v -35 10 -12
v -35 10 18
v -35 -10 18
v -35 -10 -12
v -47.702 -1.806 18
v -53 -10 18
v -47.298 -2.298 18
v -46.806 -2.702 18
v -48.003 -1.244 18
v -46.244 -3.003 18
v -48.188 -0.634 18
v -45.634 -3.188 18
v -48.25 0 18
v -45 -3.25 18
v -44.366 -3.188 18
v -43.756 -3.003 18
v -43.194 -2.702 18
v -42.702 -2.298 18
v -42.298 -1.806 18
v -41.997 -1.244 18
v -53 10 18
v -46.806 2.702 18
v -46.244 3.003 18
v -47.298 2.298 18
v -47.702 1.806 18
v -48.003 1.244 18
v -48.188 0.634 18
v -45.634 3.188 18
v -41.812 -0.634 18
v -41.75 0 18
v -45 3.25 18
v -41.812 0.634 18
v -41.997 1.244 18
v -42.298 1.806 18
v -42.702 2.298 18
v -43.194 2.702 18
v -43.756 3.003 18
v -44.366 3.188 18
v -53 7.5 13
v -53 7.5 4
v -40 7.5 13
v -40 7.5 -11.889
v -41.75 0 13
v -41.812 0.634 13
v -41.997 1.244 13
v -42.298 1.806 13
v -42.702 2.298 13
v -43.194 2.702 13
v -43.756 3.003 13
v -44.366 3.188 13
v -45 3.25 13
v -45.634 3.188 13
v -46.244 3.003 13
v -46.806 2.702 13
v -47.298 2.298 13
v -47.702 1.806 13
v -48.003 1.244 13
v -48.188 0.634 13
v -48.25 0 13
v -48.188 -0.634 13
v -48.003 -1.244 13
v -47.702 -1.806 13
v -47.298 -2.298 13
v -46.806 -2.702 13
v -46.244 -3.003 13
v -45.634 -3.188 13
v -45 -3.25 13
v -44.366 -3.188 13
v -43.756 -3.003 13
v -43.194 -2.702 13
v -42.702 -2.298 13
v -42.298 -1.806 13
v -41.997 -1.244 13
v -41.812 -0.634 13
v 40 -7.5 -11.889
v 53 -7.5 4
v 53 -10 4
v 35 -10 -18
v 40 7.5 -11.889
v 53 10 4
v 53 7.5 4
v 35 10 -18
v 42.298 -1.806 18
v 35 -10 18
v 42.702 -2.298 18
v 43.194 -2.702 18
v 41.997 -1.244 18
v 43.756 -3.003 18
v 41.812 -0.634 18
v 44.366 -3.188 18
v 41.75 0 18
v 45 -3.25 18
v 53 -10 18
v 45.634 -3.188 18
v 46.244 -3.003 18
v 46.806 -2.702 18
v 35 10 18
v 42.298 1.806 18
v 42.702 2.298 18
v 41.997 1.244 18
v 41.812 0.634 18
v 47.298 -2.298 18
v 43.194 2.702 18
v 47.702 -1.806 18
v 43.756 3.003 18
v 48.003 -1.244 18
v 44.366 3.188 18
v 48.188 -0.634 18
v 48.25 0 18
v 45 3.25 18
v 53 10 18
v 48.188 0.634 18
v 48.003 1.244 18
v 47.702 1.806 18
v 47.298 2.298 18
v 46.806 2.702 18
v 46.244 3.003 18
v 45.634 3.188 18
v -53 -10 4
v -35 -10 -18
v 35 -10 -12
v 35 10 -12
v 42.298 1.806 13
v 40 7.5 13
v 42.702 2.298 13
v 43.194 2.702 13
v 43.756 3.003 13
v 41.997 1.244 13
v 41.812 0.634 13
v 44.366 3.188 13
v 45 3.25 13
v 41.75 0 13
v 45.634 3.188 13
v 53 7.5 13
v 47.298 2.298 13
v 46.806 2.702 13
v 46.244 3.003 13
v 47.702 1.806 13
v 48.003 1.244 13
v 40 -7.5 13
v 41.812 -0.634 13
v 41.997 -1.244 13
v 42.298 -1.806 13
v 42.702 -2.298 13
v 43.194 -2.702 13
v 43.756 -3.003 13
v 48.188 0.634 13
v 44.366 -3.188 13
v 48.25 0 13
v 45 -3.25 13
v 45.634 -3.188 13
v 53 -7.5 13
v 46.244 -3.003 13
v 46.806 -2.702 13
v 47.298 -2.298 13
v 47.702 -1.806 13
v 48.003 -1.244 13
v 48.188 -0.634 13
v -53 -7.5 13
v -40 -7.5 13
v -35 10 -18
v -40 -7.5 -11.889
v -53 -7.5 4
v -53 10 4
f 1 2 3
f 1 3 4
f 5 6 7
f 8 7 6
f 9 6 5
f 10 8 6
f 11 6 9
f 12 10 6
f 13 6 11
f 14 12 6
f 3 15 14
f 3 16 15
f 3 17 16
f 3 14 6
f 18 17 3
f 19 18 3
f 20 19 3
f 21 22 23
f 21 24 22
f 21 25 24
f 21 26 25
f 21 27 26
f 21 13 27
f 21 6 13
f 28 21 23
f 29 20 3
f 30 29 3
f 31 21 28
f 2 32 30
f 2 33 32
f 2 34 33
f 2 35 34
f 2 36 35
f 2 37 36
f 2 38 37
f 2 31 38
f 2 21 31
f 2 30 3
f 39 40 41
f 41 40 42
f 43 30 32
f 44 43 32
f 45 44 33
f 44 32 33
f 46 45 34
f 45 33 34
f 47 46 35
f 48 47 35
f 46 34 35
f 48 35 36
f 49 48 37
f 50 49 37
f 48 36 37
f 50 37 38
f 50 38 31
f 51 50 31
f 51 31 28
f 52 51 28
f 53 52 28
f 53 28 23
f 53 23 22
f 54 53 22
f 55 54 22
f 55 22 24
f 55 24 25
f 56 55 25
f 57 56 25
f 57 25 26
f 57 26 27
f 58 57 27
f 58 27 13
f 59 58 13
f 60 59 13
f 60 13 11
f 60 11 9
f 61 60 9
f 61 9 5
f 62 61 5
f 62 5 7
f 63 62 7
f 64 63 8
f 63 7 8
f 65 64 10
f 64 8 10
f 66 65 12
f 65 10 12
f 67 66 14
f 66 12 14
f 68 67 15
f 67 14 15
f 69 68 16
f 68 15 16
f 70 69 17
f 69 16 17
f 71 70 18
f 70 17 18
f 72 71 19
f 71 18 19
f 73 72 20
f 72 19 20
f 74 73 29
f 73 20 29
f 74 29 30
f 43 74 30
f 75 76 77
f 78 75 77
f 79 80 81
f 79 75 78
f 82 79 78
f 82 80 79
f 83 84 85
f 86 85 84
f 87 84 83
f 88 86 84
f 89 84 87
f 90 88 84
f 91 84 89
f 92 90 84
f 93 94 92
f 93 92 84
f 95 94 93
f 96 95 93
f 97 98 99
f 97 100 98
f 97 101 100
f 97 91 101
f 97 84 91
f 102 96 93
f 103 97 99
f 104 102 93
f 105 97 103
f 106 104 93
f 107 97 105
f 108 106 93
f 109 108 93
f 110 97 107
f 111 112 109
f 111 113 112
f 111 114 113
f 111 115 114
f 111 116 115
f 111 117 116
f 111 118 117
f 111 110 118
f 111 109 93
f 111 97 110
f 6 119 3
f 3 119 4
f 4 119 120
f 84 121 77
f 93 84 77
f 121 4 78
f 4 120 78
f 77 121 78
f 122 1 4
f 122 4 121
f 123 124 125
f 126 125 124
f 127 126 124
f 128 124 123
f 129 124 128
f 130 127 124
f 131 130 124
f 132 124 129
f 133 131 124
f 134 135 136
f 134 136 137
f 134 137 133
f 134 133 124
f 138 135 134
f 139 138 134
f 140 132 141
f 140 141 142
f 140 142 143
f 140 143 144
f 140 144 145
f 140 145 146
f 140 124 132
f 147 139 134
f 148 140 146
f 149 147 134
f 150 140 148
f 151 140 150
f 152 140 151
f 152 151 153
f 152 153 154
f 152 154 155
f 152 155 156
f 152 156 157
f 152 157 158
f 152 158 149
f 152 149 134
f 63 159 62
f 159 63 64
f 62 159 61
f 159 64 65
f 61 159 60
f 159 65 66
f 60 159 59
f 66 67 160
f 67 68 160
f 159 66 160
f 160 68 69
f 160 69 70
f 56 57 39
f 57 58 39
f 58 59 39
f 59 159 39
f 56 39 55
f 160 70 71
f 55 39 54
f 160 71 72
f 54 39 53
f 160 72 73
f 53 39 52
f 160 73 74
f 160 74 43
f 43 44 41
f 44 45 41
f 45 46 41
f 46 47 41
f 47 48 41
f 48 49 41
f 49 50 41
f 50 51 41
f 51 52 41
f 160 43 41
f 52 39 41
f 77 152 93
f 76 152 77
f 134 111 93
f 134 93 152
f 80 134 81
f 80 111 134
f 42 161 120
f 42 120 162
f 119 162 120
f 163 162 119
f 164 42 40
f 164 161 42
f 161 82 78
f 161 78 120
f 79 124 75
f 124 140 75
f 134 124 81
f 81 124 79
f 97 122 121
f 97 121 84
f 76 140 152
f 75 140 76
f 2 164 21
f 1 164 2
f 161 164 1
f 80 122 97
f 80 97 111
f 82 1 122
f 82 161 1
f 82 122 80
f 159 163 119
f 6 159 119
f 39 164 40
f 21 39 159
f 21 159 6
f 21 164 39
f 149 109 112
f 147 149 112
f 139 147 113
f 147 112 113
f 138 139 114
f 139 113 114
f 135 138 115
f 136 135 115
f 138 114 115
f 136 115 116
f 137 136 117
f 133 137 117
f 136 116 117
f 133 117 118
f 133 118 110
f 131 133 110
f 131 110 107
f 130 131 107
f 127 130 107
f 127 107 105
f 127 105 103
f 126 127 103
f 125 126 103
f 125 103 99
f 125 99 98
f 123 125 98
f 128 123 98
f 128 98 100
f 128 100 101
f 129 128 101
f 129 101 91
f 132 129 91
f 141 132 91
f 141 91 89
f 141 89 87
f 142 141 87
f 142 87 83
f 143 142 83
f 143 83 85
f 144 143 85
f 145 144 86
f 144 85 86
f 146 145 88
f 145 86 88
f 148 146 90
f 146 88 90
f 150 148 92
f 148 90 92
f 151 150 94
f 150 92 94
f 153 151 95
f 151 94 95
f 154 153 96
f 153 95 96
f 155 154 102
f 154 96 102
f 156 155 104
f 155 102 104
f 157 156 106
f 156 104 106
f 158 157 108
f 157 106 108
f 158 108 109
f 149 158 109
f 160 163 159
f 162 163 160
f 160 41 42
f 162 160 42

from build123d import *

# Parameters (mm, degrees)
EXTRUDE_1_DEPTH     = 10
SKETCH_2_R          = 3.25
CUT_EXTRUDE_1_DEPTH = 65.845971347
SKETCH_4_W          = 13
SKETCH_4_H          = 24.888888889
CUT_EXTRUDE_2_DEPTH = 7.5


with BuildPart() as part:
    # 草图1 → 凸台-拉伸1 (new, symmetric)
    with BuildSketch(Plane(origin=(0, 0, 0), x_dir=(1, 0, 0), z_dir=(0, 1, 0))):
        Polygon((-53, -18), (-35, -18), (-35, 12), (35, 12), (35, -18), (53, -18), (53, -4), (35, 18), (-35, 18), (-53, -4), align=None)
    extrude(amount=EXTRUDE_1_DEPTH, both=True)

    # 草图2 → 切除-拉伸1 (cut, through all)
    with BuildSketch(Plane.XY.offset(18)):
        with Locations((-45, 0)):
            Circle(SKETCH_2_R)
        with Locations((45, 0)):
            Circle(SKETCH_2_R)
    extrude(amount=-CUT_EXTRUDE_1_DEPTH, mode=Mode.SUBTRACT)

    # 草图4 → 切除-拉伸2 (cut, symmetric)
    with BuildSketch(Plane(origin=(0, 0, 0), x_dir=(1, 0, 0), z_dir=(0, 1, 0))):
        with Locations((46.5, -0.555555555)):
            Rectangle(SKETCH_4_W, SKETCH_4_H)
        with Locations((-46.5, -0.555555555)):
            Rectangle(SKETCH_4_W, SKETCH_4_H)
    extrude(amount=CUT_EXTRUDE_2_DEPTH, both=True, mode=Mode.SUBTRACT)


solid = part.part
